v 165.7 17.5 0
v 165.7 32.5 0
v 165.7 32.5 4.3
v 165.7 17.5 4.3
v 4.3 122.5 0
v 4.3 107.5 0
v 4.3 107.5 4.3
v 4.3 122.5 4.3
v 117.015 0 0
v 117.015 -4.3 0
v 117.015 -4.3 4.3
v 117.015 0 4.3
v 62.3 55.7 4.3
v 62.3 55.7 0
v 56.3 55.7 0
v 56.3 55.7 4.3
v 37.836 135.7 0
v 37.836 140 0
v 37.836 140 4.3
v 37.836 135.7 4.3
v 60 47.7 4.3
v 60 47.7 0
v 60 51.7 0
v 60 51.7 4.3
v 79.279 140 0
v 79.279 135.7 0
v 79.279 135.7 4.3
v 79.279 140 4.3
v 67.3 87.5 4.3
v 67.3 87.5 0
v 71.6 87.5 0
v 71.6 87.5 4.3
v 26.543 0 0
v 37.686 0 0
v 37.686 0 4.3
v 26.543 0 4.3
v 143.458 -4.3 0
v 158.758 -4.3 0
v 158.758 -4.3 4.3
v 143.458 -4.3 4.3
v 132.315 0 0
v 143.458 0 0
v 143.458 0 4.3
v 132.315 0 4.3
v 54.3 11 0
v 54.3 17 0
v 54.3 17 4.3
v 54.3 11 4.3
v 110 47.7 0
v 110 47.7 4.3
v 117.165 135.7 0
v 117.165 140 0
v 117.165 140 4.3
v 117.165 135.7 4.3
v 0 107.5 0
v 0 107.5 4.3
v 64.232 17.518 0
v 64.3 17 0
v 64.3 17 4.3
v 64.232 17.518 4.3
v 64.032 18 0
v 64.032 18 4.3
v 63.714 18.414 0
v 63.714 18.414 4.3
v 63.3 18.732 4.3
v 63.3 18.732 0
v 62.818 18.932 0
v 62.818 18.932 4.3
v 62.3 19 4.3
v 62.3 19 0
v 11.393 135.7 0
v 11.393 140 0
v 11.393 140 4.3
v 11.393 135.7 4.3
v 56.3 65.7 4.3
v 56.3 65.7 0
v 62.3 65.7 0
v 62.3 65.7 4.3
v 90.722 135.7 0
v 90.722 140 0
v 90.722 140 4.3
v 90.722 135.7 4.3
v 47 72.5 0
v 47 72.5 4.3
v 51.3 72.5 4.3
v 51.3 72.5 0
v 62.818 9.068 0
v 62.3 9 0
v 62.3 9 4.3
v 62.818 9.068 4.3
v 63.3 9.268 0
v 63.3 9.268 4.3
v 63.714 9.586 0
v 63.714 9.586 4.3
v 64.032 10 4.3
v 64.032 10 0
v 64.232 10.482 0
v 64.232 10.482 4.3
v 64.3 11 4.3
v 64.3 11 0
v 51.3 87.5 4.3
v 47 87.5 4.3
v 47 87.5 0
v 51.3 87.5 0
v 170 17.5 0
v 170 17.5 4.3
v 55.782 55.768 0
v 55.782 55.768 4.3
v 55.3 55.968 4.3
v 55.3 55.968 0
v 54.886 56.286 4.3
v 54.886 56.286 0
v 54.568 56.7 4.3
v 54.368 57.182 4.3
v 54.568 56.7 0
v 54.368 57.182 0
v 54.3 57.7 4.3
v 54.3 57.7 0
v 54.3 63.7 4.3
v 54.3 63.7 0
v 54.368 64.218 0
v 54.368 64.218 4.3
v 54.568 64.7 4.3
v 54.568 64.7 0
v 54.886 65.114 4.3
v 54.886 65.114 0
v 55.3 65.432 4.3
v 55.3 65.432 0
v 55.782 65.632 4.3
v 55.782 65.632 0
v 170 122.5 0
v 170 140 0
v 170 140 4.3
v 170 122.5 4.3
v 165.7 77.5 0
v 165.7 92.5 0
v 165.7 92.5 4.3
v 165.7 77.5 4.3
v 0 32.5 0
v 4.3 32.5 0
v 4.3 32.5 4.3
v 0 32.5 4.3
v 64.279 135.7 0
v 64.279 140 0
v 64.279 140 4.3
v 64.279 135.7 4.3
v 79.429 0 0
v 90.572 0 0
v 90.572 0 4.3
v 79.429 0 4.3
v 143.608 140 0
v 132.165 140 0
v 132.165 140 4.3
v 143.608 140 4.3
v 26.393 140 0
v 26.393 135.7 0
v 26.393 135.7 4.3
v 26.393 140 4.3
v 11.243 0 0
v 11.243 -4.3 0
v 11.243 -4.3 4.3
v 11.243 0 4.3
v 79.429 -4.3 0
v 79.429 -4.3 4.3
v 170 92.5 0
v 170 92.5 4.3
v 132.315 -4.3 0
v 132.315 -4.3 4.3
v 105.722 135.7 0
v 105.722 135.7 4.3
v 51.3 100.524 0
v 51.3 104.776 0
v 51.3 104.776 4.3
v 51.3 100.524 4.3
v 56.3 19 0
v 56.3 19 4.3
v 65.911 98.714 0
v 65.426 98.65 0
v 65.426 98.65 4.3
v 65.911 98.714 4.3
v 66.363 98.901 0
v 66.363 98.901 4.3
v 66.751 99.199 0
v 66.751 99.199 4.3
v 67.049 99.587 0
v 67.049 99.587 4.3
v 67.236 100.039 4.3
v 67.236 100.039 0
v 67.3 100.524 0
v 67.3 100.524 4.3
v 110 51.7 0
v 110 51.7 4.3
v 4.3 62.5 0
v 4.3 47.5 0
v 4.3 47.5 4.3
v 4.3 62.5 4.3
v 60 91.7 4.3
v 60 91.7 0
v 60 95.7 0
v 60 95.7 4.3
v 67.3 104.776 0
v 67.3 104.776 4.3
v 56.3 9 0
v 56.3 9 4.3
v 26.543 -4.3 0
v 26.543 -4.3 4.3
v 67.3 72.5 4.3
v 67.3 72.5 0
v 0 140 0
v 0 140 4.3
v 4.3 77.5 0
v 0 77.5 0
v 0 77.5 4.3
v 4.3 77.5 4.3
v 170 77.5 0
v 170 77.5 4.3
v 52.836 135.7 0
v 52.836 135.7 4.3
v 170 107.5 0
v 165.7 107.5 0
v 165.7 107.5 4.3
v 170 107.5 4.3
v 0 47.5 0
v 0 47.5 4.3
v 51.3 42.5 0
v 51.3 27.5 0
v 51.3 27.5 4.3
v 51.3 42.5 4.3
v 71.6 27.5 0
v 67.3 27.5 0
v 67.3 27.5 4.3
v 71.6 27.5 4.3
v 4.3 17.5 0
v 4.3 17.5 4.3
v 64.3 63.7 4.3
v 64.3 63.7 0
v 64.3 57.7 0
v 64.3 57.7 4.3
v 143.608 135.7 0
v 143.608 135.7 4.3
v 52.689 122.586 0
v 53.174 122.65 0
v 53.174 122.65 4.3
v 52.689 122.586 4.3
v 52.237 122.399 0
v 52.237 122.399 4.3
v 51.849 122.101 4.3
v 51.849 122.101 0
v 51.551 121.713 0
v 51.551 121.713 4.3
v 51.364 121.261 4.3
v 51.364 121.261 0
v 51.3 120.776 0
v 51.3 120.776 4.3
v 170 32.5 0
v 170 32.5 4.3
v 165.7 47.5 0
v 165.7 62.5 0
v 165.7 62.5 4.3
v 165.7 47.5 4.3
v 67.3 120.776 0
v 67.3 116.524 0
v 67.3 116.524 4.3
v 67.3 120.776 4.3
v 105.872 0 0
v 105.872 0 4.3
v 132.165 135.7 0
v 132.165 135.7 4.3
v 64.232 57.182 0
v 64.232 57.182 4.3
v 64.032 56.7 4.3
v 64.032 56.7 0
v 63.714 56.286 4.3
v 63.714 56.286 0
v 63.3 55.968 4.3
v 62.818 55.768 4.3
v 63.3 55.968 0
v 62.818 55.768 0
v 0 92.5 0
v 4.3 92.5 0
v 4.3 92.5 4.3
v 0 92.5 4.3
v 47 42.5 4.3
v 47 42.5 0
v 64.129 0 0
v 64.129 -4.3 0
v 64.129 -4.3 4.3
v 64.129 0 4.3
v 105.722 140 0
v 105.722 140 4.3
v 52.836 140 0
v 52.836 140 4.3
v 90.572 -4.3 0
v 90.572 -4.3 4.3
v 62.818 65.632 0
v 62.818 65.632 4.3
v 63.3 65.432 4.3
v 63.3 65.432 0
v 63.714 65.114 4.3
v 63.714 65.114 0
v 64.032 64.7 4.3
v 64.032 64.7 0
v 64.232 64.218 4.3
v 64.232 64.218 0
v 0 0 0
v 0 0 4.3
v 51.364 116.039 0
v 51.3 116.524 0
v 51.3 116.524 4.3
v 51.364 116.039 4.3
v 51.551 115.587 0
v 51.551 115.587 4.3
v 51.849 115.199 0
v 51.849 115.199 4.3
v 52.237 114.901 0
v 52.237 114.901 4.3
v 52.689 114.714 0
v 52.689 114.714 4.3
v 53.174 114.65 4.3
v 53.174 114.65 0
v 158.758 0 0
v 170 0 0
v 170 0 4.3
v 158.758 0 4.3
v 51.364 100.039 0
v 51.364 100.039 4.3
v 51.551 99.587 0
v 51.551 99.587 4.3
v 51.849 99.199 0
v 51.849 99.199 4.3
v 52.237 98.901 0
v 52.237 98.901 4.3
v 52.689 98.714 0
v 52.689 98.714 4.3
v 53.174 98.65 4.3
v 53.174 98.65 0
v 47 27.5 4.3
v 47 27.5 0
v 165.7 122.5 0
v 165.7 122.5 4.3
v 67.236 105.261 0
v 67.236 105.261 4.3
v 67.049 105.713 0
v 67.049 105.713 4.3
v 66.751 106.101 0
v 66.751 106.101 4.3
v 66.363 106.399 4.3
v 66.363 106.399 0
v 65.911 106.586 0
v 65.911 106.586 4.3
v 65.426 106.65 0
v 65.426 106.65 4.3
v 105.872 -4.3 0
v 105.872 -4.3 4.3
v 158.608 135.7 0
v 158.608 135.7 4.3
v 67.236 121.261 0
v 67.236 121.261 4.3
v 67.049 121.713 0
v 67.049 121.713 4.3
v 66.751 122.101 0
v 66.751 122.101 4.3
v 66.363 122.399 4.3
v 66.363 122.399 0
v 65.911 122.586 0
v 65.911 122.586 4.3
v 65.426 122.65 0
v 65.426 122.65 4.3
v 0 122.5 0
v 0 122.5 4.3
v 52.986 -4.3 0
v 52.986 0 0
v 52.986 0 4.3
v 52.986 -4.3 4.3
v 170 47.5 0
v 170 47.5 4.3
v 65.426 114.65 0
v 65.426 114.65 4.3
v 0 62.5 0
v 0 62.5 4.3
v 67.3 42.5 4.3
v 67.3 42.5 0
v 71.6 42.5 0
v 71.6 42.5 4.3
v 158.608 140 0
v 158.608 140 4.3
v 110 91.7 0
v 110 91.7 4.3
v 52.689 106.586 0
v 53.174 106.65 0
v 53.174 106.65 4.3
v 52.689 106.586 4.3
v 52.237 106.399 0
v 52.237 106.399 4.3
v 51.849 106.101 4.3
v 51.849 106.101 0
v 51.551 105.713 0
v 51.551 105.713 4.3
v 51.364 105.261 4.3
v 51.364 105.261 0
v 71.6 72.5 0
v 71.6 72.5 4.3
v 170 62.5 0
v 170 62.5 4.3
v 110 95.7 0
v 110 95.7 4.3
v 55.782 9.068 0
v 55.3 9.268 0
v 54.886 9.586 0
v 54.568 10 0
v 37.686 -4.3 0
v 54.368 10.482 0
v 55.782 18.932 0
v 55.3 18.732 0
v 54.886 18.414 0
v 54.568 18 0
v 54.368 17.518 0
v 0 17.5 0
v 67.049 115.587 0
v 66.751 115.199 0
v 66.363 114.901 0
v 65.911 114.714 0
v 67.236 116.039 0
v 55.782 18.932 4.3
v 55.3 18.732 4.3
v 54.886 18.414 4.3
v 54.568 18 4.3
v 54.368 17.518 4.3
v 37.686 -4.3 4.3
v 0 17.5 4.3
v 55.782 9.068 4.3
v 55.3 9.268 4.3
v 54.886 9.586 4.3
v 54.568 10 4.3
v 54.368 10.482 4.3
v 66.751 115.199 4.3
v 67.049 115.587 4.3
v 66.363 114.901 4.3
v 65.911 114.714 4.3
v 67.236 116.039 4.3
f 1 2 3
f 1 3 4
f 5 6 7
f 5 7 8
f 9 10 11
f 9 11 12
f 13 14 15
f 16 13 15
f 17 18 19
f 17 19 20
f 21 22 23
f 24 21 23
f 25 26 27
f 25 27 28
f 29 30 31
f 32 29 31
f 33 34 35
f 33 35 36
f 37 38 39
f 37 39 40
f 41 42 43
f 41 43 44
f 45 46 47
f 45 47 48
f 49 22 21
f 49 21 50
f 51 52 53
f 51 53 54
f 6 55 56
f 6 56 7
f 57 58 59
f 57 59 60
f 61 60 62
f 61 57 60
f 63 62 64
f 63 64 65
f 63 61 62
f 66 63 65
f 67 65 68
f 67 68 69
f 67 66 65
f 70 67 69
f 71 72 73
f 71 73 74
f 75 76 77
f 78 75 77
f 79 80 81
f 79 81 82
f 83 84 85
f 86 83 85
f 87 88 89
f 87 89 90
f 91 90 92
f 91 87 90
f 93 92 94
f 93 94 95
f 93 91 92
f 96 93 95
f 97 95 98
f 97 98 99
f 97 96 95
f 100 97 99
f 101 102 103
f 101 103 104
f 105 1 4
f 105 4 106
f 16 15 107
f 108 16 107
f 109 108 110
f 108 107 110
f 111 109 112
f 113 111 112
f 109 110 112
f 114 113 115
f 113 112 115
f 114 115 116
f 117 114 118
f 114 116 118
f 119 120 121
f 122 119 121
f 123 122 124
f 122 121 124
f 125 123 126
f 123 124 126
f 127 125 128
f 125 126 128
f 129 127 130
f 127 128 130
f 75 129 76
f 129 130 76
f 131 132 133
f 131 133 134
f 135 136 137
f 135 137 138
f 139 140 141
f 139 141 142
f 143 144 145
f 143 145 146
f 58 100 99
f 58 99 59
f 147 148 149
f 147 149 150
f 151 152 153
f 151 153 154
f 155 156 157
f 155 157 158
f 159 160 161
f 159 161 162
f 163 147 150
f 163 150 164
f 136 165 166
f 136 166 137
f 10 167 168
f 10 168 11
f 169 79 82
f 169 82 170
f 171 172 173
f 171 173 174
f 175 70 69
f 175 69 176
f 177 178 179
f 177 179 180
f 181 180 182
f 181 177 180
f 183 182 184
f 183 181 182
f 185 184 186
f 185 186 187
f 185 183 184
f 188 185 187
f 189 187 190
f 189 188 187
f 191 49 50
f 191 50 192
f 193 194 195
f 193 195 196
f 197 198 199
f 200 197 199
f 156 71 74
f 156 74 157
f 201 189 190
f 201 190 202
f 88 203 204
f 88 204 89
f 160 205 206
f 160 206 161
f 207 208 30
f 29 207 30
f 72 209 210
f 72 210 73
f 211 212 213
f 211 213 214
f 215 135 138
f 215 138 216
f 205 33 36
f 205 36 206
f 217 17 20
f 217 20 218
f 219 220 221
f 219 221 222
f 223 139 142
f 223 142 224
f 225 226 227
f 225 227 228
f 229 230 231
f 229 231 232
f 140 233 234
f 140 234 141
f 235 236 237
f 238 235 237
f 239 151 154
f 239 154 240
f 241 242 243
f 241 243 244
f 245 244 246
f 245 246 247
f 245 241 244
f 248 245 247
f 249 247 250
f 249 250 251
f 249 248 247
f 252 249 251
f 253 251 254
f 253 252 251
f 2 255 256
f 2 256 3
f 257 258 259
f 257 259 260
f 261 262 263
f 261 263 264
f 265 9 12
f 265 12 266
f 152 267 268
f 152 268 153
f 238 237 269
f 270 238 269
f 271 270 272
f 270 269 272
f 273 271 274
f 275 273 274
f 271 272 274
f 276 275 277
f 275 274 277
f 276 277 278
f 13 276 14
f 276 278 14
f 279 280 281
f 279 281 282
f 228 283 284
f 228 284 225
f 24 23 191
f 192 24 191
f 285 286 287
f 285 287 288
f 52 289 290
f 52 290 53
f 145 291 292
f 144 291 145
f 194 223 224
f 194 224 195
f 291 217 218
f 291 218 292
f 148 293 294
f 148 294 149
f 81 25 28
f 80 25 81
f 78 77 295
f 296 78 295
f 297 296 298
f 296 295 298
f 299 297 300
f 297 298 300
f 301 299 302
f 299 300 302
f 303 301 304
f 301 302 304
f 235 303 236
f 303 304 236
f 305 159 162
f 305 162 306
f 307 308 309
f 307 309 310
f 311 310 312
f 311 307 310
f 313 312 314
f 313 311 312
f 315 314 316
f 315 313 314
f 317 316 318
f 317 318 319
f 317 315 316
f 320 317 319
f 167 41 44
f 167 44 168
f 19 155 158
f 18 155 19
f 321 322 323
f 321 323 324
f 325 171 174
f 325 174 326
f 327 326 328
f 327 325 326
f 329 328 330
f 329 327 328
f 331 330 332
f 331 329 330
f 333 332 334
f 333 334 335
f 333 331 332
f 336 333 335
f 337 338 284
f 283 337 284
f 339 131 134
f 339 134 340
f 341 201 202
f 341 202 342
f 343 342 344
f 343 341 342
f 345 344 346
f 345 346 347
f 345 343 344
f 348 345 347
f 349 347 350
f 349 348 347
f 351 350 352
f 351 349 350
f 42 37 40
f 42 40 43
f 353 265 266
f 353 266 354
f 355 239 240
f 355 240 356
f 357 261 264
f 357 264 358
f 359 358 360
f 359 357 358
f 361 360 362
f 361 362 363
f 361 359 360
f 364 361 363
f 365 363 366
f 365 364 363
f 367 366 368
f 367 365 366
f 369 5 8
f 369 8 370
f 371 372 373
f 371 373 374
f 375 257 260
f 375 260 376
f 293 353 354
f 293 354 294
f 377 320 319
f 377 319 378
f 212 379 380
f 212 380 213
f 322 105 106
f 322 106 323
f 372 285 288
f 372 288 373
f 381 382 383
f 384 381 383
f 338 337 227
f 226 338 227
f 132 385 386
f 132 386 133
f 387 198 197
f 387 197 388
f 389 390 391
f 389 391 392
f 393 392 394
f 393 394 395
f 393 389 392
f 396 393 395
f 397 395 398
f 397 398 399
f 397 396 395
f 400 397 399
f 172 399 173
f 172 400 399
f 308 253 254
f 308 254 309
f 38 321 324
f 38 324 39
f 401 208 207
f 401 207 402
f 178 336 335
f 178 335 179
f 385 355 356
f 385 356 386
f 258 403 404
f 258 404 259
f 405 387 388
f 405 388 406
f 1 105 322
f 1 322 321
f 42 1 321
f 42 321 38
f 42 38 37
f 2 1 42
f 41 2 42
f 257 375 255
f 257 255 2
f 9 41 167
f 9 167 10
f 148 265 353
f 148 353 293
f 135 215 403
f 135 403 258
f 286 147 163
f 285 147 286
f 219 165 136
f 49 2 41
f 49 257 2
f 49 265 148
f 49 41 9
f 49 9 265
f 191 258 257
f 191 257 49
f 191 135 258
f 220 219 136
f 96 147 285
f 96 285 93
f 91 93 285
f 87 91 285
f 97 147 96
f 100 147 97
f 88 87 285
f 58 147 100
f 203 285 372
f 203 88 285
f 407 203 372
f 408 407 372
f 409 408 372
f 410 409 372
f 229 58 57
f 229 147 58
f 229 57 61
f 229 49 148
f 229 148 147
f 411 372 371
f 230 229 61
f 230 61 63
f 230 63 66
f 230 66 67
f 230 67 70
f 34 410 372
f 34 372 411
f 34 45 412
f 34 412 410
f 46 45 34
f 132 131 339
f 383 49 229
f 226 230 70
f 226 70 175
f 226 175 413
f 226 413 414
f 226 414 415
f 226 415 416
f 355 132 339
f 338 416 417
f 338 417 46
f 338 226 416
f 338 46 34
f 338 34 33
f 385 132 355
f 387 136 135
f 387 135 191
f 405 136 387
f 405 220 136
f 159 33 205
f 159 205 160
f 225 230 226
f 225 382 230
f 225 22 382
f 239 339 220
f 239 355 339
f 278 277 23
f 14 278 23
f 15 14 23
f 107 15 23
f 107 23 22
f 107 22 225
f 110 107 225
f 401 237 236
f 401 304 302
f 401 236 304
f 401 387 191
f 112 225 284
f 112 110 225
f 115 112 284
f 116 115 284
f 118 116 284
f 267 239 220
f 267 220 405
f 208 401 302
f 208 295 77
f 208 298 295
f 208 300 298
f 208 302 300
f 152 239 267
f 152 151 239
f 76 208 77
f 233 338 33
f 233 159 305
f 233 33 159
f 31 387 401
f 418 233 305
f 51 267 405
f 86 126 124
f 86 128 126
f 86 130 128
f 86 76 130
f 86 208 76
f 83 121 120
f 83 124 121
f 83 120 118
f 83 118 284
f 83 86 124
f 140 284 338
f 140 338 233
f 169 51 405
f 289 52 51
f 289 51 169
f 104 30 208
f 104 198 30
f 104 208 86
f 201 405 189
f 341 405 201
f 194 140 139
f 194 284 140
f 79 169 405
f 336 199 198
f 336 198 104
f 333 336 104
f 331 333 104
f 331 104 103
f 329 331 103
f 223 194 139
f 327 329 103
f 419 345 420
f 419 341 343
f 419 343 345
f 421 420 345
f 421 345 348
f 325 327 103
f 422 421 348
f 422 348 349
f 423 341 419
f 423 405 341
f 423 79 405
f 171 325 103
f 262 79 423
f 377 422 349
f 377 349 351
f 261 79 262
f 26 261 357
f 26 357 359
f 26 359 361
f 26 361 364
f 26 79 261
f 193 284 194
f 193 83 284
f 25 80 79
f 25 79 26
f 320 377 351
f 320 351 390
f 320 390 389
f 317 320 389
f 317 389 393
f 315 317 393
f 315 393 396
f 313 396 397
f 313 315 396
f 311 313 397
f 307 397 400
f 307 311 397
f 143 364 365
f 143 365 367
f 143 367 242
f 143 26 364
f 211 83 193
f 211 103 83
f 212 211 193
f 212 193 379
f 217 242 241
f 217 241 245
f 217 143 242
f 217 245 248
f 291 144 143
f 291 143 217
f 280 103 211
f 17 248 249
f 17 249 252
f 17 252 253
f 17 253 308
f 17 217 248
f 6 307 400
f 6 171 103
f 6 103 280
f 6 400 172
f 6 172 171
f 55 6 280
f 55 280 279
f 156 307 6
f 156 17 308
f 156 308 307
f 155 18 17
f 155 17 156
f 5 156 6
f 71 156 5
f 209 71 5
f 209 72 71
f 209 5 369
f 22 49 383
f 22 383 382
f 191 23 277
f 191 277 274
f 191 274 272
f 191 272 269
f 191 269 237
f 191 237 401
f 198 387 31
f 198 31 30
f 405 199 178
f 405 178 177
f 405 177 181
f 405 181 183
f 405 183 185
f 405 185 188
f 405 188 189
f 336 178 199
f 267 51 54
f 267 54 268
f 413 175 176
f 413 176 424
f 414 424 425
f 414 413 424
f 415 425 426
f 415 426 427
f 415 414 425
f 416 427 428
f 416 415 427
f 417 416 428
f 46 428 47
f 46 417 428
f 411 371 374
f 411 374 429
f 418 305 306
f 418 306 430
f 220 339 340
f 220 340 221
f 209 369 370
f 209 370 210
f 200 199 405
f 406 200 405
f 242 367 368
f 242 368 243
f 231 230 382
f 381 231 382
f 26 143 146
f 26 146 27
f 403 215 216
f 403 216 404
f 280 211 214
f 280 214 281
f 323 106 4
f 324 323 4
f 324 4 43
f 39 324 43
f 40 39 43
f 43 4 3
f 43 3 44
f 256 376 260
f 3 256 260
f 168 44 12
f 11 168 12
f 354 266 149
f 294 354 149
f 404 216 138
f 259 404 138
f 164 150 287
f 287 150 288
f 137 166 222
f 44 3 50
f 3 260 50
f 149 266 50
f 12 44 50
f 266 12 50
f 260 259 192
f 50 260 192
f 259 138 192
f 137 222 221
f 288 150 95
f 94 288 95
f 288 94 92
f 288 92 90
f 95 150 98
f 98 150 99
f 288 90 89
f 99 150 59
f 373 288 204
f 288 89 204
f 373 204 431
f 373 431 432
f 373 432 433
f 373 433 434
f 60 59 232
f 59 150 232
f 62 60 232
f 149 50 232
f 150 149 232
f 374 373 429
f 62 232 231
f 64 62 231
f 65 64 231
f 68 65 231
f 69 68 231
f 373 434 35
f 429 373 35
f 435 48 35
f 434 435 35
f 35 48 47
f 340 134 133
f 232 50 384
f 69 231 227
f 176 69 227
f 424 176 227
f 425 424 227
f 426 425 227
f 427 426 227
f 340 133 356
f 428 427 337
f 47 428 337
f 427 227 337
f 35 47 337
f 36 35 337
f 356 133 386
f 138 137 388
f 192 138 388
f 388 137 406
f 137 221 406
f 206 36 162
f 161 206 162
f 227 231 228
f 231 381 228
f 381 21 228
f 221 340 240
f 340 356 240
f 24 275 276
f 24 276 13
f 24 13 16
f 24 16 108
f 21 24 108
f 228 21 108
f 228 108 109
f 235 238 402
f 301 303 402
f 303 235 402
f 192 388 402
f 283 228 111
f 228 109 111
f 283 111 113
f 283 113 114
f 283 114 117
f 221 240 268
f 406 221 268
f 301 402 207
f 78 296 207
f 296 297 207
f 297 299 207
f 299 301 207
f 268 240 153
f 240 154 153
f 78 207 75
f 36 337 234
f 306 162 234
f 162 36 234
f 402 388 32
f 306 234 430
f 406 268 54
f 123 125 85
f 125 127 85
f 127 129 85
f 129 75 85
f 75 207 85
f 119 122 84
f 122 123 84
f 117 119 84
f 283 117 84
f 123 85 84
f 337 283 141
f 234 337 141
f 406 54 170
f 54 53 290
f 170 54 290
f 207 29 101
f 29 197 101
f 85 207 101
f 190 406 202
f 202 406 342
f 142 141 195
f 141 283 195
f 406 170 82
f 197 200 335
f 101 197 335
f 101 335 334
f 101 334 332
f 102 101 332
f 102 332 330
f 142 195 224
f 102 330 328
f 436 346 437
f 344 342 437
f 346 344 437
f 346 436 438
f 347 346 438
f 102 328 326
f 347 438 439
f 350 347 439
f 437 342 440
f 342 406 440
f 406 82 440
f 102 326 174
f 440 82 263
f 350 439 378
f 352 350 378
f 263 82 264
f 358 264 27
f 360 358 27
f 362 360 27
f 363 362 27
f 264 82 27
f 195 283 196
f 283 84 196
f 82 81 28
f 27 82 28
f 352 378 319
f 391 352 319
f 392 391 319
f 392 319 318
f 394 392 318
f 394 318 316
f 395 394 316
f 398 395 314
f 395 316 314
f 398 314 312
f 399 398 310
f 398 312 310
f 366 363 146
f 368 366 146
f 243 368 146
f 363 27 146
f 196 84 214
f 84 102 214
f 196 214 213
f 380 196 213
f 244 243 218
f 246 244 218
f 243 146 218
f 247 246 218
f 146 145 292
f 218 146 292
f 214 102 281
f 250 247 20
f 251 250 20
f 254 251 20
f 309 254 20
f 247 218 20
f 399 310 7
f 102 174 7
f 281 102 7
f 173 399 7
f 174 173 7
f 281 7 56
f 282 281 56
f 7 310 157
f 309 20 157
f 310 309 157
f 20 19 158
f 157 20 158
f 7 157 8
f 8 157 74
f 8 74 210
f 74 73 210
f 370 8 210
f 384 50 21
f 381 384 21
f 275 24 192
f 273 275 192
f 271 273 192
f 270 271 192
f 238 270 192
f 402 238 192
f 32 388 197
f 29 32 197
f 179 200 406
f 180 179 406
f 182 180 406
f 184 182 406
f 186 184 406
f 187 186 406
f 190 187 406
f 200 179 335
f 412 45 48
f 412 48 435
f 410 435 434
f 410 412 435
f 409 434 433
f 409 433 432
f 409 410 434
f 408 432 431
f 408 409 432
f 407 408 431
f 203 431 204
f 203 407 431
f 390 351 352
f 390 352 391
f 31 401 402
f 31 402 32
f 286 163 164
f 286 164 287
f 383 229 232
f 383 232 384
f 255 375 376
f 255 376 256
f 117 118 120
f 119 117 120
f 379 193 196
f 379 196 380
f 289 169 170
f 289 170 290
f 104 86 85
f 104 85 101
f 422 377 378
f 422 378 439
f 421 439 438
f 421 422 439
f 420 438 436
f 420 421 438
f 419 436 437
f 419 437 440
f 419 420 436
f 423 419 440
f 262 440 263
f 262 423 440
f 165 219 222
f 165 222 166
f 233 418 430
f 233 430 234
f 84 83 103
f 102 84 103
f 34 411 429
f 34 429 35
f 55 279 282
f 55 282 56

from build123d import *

# Parameters (mm, degrees)
SKETCH1_W           = 4.3
SKETCH1_H           = 15
SKETCH1_W_2         = 50
SKETCH1_H_2         = 4
BOSS_EXTRUDE1_DEPTH = 4.3


with BuildPart() as part:
    # Sketch1 → Boss-Extrude1 (new body)
    with BuildSketch(Plane.XY):
        Polygon((0, 140), (11.393, 140), (11.393, 135.7), (26.393, 135.7), (26.393, 140), (37.836, 140), (37.836, 135.7), (52.836, 135.7), (52.836, 140), (64.279, 140), (64.279, 135.7), (79.279, 135.7), (79.279, 140), (90.722, 140), (90.722, 135.7), (105.722, 135.7), (105.722, 140), (117.165, 140), (117.165, 135.7), (132.165, 135.7), (132.165, 140), (143.608, 140), (143.608, 135.7), (158.608, 135.7), (158.608, 140), (170, 140), (170, 122.5), (165.7, 122.5), (165.7, 107.5), (170, 107.5), (170, 92.5), (165.7, 92.5), (165.7, 77.5), (170, 77.5), (170, 62.5), (165.7, 62.5), (165.7, 47.5), (170, 47.5), (170, 32.5), (165.7, 32.5), (165.7, 17.5), (170, 17.5), (170, 0), (158.758, 0), (158.758, -4.3), (143.458, -4.3), (143.458, 0), (132.315, 0), (132.315, -4.3), (117.015, -4.3), (117.015, 0), (105.872, 0), (105.872, -4.3), (90.572, -4.3), (90.572, 0), (79.429, 0), (79.429, -4.3), (64.129, -4.3), (64.129, 0), (52.986, 0), (52.986, -4.3), (37.686, -4.3), (37.686, 0), (26.543, 0), (26.543, -4.3), (11.243, -4.3), (11.243, 0), (0, 0), (0, 17.5), (4.3, 17.5), (4.3, 32.5), (0, 32.5), (0, 47.5), (4.3, 47.5), (4.3, 62.5), (0, 62.5), (0, 77.5), (4.3, 77.5), (4.3, 92.5), (0, 92.5), (0, 107.5), (4.3, 107.5), (4.3, 122.5), (0, 122.5), align=None)
        with Locations((69.45, 35)):
            Rectangle(SKETCH1_W, SKETCH1_H, mode=Mode.SUBTRACT)
        with Locations((69.45, 80)):
            Rectangle(SKETCH1_W, SKETCH1_H, mode=Mode.SUBTRACT)
        with Locations((49.15, 80)):
            Rectangle(SKETCH1_W, SKETCH1_H, mode=Mode.SUBTRACT)
        with Locations((85, 49.7)):
            Rectangle(SKETCH1_W_2, SKETCH1_H_2, mode=Mode.SUBTRACT)
        with Locations((85, 93.7)):
            Rectangle(SKETCH1_W_2, SKETCH1_H_2, mode=Mode.SUBTRACT)
        with BuildLine():
            Line((53.173708042, 114.65), (65.426291958, 114.65))
            ThreePointArc((65.426291958, 114.65), (66.75120362, 115.19879638), (67.3, 116.523708042))
            Line((67.3, 116.523708042), (67.3, 120.776291958))
            ThreePointArc((67.3, 120.776291958), (66.75120362, 122.10120362), (65.426291958, 122.65))
            Line((65.426291958, 122.65), (53.173708042, 122.65))
            ThreePointArc((53.173708042, 122.65), (51.84879638, 122.10120362), (51.3, 120.776291958))
            Line((51.3, 120.776291958), (51.3, 116.523708042))
            ThreePointArc((51.3, 116.523708042), (51.84879638, 115.19879638), (53.173708042, 114.65))
        make_face(mode=Mode.SUBTRACT)
        with BuildLine():
            Line((53.173708042, 98.65), (65.426291958, 98.65))
            ThreePointArc((65.426291958, 98.65), (66.75120362, 99.19879638), (67.3, 100.523708042))
            Line((67.3, 100.523708042), (67.3, 104.776291958))
            ThreePointArc((67.3, 104.776291958), (66.75120362, 106.10120362), (65.426291958, 106.65))
            Line((65.426291958, 106.65), (53.173708042, 106.65))
            ThreePointArc((53.173708042, 106.65), (51.84879638, 106.10120362), (51.3, 104.776291958))
            Line((51.3, 104.776291958), (51.3, 100.523708042))
            ThreePointArc((51.3, 100.523708042), (51.84879638, 99.19879638), (53.173708042, 98.65))
        make_face(mode=Mode.SUBTRACT)
        with Locations((49.15, 35)):
            Rectangle(SKETCH1_W, SKETCH1_H, mode=Mode.SUBTRACT)
        with BuildLine():
            Line((56.3, 9), (62.3, 9))
            ThreePointArc((62.3, 9), (63.714213562, 9.585786438), (64.3, 11))
            Line((64.3, 11), (64.3, 17))
            ThreePointArc((64.3, 17), (63.714213562, 18.414213562), (62.3, 19))
            Line((62.3, 19), (56.3, 19))
            ThreePointArc((56.3, 19), (54.885786438, 18.414213562), (54.3, 17))
            Line((54.3, 17), (54.3, 11))
            ThreePointArc((54.3, 11), (54.885786438, 9.585786438), (56.3, 9))
        make_face(mode=Mode.SUBTRACT)
        with BuildLine():
            Line((56.3, 65.7), (62.3, 65.7))
            ThreePointArc((62.3, 65.7), (63.714213562, 65.114213562), (64.3, 63.7))
            Line((64.3, 63.7), (64.3, 57.7))
            ThreePointArc((64.3, 57.7), (63.714213562, 56.285786438), (62.3, 55.7))
            Line((62.3, 55.7), (56.3, 55.7))
            ThreePointArc((56.3, 55.7), (54.885786438, 56.285786438), (54.3, 57.7))
            Line((54.3, 57.7), (54.3, 63.7))
            ThreePointArc((54.3, 63.7), (54.885786438, 65.114213562), (56.3, 65.7))
        make_face(mode=Mode.SUBTRACT)
    extrude(amount=BOSS_EXTRUDE1_DEPTH)


solid = part.part
